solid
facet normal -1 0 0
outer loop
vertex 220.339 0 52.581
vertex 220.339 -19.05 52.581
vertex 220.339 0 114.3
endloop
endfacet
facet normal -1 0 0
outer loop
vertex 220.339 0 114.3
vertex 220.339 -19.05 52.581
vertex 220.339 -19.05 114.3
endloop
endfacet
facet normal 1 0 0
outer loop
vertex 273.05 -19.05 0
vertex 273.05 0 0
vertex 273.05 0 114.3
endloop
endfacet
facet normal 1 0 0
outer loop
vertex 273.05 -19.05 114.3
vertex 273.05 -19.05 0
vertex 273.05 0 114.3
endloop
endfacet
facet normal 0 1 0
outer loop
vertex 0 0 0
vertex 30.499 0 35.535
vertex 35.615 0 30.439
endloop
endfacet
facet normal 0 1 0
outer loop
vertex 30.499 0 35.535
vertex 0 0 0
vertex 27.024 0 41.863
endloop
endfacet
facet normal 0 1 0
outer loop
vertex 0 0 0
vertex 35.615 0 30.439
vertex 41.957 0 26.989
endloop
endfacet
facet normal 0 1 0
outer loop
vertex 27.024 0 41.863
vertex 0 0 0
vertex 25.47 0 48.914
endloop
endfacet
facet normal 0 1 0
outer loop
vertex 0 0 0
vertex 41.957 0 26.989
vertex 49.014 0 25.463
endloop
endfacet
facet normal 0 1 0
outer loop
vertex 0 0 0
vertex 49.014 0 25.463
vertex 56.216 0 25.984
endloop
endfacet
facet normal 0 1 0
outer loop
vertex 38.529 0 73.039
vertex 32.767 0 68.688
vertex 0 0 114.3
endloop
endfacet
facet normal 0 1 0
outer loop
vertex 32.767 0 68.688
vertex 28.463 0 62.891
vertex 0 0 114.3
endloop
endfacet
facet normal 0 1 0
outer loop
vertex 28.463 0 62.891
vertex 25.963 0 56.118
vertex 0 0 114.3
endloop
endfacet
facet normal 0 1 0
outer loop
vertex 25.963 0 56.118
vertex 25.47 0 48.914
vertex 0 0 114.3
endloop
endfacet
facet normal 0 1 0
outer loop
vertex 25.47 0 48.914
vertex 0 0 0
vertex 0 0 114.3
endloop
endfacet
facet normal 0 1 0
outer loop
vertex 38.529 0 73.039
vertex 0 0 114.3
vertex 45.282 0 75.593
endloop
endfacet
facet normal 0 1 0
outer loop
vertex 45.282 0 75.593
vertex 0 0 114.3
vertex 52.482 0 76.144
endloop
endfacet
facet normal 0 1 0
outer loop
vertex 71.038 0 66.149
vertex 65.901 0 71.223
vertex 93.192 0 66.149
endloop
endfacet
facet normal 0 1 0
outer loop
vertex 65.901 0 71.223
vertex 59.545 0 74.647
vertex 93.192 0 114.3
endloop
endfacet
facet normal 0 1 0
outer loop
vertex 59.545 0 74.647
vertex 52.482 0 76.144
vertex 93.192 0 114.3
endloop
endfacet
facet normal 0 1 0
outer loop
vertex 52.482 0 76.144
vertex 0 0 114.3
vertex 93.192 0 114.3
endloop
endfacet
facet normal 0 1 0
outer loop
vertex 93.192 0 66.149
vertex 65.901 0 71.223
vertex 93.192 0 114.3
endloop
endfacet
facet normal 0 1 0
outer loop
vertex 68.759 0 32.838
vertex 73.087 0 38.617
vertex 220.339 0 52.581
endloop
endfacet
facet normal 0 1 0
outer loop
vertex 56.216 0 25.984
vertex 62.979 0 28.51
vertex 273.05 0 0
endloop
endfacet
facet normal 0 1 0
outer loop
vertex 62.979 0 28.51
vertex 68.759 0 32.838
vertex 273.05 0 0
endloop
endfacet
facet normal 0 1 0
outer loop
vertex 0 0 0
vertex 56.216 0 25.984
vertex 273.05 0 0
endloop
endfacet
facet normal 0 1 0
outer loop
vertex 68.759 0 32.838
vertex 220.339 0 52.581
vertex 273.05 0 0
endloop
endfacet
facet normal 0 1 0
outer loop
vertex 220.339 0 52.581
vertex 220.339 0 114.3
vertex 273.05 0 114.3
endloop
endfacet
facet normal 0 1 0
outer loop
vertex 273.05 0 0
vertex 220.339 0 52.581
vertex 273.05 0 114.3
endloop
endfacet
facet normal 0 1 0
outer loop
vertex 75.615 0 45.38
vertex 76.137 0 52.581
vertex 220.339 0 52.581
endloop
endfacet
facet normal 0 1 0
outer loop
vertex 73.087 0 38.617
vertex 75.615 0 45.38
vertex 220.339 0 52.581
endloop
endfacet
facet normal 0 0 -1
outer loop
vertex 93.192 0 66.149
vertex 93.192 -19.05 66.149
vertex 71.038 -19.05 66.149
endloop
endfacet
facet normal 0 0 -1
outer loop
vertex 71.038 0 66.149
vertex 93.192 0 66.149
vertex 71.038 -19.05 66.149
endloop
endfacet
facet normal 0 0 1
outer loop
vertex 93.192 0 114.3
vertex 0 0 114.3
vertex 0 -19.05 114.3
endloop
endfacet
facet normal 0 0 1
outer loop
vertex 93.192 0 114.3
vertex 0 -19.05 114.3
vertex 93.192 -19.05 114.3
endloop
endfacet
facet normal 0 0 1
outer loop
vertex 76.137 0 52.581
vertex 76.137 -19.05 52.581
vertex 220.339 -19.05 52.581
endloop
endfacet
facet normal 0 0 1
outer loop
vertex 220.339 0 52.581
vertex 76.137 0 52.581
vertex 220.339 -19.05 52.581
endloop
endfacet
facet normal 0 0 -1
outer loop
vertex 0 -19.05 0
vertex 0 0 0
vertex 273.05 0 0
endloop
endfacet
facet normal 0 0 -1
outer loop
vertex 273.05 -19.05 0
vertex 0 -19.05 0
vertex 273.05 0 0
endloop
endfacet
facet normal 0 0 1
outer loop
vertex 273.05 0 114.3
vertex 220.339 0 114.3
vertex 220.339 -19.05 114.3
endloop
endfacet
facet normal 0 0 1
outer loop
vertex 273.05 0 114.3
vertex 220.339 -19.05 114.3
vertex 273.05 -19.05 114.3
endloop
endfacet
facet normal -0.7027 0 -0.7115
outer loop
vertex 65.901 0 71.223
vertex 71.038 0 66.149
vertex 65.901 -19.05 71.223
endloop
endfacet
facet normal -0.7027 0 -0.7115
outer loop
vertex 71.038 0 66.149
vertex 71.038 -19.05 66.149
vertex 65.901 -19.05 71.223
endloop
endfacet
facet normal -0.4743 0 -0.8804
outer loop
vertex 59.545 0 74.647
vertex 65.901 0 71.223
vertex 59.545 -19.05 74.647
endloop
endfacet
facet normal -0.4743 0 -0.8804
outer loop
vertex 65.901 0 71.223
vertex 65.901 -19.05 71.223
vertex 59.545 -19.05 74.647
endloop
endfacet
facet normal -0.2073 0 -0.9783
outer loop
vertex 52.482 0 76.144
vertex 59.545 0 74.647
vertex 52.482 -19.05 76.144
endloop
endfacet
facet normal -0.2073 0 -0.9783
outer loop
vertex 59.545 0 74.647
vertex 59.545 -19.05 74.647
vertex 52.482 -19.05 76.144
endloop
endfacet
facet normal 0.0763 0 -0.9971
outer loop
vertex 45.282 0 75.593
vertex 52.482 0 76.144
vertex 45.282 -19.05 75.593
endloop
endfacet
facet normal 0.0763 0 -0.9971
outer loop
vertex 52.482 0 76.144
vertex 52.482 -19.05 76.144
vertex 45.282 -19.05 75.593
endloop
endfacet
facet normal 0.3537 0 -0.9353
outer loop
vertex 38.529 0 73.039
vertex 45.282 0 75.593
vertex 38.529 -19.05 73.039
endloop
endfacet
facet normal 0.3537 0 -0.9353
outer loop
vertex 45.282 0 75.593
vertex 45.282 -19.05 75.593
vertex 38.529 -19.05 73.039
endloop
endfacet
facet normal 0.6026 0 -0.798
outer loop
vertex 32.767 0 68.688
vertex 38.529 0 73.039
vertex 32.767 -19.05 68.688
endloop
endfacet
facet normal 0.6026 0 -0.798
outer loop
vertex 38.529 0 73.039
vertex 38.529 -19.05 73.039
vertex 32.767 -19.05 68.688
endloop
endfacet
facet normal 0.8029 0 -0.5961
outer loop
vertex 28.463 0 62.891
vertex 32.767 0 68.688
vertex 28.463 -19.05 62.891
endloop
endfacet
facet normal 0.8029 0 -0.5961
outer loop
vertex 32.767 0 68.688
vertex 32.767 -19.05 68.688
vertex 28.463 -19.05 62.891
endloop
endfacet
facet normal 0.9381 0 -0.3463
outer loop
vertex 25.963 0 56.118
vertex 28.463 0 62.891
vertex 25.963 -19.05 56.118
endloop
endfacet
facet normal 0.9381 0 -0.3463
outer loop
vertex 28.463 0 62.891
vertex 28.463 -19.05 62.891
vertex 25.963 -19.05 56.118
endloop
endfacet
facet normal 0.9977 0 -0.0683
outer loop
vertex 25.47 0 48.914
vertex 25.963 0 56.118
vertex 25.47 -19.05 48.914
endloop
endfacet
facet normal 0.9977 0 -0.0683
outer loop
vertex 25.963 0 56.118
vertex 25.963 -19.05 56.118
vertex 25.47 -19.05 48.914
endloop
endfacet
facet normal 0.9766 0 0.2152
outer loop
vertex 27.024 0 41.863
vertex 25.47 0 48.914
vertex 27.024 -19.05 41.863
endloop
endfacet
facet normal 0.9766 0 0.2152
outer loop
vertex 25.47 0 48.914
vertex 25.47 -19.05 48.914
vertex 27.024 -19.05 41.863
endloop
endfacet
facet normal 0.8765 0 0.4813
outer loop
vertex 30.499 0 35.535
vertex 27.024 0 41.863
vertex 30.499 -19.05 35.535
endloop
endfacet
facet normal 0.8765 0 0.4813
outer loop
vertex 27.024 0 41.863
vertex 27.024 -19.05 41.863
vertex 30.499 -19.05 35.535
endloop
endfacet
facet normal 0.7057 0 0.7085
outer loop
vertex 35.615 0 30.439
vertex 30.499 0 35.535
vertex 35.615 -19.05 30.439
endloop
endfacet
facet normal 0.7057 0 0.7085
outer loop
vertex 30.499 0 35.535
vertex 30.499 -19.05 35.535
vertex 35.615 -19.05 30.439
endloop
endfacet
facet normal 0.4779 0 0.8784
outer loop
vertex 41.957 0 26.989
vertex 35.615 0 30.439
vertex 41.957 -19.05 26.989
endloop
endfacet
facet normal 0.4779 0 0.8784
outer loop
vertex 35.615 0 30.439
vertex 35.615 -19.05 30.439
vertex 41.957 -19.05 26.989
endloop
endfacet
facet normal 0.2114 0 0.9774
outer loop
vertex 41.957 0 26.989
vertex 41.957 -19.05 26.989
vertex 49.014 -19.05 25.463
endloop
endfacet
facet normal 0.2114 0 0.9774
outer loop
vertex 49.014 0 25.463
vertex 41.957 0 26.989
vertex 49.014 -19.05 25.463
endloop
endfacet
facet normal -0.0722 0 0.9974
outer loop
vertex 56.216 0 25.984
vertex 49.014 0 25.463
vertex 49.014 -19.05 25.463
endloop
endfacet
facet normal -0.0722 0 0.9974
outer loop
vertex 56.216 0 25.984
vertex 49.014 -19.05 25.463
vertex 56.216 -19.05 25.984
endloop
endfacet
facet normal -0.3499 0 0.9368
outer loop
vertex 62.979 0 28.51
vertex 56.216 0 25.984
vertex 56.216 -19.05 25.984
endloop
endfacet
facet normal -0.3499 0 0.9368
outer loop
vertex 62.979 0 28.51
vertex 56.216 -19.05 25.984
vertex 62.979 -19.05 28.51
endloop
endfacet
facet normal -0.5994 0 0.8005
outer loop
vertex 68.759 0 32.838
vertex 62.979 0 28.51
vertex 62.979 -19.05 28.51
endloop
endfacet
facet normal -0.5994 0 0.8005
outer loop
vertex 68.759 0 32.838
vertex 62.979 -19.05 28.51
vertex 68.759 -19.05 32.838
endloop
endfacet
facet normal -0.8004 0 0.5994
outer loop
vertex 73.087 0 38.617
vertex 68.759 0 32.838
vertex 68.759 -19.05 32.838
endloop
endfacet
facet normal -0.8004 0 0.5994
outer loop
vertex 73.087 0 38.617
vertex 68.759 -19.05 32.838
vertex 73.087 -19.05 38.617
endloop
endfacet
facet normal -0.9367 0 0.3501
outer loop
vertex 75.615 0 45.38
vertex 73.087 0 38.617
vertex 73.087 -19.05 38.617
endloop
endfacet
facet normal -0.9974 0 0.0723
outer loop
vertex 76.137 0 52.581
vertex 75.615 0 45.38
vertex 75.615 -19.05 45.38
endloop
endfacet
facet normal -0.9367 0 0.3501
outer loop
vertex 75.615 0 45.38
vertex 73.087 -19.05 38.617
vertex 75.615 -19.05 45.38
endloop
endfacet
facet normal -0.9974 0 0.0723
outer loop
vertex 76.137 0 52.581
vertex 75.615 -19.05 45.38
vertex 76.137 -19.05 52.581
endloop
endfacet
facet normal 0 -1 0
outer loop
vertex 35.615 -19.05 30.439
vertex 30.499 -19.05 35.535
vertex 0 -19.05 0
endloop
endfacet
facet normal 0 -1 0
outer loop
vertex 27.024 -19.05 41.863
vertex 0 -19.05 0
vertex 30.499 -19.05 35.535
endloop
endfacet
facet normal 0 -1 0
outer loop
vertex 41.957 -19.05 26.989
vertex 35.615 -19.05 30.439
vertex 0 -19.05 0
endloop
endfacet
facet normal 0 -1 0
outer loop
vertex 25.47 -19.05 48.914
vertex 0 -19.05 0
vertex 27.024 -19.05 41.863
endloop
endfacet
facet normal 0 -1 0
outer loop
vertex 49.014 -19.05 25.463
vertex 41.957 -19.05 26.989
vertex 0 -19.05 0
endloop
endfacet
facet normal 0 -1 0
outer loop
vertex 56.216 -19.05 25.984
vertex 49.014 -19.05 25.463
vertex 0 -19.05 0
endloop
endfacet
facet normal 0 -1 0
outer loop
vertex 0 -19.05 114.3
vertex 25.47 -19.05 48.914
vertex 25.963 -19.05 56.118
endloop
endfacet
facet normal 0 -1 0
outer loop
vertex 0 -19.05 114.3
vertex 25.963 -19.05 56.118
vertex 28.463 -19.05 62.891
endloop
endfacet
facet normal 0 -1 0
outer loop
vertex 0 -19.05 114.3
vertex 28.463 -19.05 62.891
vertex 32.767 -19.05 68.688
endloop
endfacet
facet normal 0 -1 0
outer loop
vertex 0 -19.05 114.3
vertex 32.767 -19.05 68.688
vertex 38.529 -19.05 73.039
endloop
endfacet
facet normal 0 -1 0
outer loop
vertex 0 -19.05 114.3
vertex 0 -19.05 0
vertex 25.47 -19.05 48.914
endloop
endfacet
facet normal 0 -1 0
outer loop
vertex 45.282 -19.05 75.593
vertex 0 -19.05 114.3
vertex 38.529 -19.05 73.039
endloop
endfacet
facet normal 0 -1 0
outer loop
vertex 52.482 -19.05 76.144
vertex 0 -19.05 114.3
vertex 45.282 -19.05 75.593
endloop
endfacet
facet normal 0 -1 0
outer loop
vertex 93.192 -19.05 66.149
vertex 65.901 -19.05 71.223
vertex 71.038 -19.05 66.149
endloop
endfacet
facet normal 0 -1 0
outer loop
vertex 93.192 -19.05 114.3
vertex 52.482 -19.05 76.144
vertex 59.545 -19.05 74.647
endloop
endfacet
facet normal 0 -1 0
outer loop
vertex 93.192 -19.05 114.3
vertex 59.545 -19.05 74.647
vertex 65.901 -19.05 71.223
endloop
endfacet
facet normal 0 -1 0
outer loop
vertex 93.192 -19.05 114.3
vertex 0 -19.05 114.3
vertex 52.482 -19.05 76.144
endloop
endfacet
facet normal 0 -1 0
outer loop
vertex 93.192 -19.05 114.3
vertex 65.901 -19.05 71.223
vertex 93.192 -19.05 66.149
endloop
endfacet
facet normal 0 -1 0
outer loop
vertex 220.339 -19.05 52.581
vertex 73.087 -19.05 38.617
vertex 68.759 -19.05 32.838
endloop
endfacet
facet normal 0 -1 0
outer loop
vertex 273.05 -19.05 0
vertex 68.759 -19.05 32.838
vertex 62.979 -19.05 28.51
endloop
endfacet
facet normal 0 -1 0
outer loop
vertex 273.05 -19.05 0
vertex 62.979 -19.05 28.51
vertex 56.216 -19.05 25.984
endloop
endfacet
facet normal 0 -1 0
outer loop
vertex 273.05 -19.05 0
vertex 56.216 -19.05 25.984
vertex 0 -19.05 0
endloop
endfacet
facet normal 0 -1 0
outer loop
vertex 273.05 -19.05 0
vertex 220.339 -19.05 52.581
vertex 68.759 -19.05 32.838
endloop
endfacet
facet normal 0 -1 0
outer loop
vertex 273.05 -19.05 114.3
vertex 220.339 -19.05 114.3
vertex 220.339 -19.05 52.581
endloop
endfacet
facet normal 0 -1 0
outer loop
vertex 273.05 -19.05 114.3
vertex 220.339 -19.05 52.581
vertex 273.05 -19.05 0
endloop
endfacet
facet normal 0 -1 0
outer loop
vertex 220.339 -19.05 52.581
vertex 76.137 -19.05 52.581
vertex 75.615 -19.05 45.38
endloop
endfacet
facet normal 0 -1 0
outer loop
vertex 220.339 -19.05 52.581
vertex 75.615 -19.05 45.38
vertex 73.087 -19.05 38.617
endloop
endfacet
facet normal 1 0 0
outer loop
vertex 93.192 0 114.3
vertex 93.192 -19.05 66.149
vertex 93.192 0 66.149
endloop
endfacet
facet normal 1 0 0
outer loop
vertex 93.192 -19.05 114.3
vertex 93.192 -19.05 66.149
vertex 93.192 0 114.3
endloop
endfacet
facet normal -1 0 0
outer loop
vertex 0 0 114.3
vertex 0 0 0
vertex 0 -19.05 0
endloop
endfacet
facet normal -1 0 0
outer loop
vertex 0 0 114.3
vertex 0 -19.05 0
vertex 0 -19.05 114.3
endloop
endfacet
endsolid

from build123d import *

# Parameters (mm, degrees)
F0_W     = 273.05
F0_H     = 114.3
F1_DEPTH = 19.05
F2_R     = 25.4
F3_DEPTH = 25.4
F4_W     = 127.1476745605
F4_H     = 61.7186785519
F5_DEPTH = 25.4
F7_DEPTH = 25.4


with BuildPart() as f1:
    # F0 (on Front) → F1 (new body)
    with BuildSketch(Plane.XZ):
        with Locations((136.525, 57.15)):
            Rectangle(F0_W, F0_H)
    extrude(amount=F1_DEPTH)

    # F2 (on face) → F3 (cut)
    with BuildSketch(Plane.XZ.offset(19.05)):
        with Locations((50.8, 50.8)):
            Circle(F2_R)
    extrude(amount=-F3_DEPTH, mode=Mode.SUBTRACT)

    # F4 (on face) → F5 (cut)
    with BuildSketch(Plane.XZ.offset(19.05)):
        with Locations((156.7656248808, 83.440660724)):
            Rectangle(F4_W, F4_H)
    extrude(amount=-F5_DEPTH, mode=Mode.SUBTRACT)

    # F6 (on face) → F7 (cut)
    with BuildSketch(Plane.XZ.offset(19.05)):
        Polygon((93.1917876005, 52.5813214481), (93.1917876005, 66.1489069462), (71.0378619315, 66.1489069462), (76.137460289, 52.5813214481), align=None)
    extrude(amount=-F7_DEPTH, mode=Mode.SUBTRACT)


solid = f1.part
